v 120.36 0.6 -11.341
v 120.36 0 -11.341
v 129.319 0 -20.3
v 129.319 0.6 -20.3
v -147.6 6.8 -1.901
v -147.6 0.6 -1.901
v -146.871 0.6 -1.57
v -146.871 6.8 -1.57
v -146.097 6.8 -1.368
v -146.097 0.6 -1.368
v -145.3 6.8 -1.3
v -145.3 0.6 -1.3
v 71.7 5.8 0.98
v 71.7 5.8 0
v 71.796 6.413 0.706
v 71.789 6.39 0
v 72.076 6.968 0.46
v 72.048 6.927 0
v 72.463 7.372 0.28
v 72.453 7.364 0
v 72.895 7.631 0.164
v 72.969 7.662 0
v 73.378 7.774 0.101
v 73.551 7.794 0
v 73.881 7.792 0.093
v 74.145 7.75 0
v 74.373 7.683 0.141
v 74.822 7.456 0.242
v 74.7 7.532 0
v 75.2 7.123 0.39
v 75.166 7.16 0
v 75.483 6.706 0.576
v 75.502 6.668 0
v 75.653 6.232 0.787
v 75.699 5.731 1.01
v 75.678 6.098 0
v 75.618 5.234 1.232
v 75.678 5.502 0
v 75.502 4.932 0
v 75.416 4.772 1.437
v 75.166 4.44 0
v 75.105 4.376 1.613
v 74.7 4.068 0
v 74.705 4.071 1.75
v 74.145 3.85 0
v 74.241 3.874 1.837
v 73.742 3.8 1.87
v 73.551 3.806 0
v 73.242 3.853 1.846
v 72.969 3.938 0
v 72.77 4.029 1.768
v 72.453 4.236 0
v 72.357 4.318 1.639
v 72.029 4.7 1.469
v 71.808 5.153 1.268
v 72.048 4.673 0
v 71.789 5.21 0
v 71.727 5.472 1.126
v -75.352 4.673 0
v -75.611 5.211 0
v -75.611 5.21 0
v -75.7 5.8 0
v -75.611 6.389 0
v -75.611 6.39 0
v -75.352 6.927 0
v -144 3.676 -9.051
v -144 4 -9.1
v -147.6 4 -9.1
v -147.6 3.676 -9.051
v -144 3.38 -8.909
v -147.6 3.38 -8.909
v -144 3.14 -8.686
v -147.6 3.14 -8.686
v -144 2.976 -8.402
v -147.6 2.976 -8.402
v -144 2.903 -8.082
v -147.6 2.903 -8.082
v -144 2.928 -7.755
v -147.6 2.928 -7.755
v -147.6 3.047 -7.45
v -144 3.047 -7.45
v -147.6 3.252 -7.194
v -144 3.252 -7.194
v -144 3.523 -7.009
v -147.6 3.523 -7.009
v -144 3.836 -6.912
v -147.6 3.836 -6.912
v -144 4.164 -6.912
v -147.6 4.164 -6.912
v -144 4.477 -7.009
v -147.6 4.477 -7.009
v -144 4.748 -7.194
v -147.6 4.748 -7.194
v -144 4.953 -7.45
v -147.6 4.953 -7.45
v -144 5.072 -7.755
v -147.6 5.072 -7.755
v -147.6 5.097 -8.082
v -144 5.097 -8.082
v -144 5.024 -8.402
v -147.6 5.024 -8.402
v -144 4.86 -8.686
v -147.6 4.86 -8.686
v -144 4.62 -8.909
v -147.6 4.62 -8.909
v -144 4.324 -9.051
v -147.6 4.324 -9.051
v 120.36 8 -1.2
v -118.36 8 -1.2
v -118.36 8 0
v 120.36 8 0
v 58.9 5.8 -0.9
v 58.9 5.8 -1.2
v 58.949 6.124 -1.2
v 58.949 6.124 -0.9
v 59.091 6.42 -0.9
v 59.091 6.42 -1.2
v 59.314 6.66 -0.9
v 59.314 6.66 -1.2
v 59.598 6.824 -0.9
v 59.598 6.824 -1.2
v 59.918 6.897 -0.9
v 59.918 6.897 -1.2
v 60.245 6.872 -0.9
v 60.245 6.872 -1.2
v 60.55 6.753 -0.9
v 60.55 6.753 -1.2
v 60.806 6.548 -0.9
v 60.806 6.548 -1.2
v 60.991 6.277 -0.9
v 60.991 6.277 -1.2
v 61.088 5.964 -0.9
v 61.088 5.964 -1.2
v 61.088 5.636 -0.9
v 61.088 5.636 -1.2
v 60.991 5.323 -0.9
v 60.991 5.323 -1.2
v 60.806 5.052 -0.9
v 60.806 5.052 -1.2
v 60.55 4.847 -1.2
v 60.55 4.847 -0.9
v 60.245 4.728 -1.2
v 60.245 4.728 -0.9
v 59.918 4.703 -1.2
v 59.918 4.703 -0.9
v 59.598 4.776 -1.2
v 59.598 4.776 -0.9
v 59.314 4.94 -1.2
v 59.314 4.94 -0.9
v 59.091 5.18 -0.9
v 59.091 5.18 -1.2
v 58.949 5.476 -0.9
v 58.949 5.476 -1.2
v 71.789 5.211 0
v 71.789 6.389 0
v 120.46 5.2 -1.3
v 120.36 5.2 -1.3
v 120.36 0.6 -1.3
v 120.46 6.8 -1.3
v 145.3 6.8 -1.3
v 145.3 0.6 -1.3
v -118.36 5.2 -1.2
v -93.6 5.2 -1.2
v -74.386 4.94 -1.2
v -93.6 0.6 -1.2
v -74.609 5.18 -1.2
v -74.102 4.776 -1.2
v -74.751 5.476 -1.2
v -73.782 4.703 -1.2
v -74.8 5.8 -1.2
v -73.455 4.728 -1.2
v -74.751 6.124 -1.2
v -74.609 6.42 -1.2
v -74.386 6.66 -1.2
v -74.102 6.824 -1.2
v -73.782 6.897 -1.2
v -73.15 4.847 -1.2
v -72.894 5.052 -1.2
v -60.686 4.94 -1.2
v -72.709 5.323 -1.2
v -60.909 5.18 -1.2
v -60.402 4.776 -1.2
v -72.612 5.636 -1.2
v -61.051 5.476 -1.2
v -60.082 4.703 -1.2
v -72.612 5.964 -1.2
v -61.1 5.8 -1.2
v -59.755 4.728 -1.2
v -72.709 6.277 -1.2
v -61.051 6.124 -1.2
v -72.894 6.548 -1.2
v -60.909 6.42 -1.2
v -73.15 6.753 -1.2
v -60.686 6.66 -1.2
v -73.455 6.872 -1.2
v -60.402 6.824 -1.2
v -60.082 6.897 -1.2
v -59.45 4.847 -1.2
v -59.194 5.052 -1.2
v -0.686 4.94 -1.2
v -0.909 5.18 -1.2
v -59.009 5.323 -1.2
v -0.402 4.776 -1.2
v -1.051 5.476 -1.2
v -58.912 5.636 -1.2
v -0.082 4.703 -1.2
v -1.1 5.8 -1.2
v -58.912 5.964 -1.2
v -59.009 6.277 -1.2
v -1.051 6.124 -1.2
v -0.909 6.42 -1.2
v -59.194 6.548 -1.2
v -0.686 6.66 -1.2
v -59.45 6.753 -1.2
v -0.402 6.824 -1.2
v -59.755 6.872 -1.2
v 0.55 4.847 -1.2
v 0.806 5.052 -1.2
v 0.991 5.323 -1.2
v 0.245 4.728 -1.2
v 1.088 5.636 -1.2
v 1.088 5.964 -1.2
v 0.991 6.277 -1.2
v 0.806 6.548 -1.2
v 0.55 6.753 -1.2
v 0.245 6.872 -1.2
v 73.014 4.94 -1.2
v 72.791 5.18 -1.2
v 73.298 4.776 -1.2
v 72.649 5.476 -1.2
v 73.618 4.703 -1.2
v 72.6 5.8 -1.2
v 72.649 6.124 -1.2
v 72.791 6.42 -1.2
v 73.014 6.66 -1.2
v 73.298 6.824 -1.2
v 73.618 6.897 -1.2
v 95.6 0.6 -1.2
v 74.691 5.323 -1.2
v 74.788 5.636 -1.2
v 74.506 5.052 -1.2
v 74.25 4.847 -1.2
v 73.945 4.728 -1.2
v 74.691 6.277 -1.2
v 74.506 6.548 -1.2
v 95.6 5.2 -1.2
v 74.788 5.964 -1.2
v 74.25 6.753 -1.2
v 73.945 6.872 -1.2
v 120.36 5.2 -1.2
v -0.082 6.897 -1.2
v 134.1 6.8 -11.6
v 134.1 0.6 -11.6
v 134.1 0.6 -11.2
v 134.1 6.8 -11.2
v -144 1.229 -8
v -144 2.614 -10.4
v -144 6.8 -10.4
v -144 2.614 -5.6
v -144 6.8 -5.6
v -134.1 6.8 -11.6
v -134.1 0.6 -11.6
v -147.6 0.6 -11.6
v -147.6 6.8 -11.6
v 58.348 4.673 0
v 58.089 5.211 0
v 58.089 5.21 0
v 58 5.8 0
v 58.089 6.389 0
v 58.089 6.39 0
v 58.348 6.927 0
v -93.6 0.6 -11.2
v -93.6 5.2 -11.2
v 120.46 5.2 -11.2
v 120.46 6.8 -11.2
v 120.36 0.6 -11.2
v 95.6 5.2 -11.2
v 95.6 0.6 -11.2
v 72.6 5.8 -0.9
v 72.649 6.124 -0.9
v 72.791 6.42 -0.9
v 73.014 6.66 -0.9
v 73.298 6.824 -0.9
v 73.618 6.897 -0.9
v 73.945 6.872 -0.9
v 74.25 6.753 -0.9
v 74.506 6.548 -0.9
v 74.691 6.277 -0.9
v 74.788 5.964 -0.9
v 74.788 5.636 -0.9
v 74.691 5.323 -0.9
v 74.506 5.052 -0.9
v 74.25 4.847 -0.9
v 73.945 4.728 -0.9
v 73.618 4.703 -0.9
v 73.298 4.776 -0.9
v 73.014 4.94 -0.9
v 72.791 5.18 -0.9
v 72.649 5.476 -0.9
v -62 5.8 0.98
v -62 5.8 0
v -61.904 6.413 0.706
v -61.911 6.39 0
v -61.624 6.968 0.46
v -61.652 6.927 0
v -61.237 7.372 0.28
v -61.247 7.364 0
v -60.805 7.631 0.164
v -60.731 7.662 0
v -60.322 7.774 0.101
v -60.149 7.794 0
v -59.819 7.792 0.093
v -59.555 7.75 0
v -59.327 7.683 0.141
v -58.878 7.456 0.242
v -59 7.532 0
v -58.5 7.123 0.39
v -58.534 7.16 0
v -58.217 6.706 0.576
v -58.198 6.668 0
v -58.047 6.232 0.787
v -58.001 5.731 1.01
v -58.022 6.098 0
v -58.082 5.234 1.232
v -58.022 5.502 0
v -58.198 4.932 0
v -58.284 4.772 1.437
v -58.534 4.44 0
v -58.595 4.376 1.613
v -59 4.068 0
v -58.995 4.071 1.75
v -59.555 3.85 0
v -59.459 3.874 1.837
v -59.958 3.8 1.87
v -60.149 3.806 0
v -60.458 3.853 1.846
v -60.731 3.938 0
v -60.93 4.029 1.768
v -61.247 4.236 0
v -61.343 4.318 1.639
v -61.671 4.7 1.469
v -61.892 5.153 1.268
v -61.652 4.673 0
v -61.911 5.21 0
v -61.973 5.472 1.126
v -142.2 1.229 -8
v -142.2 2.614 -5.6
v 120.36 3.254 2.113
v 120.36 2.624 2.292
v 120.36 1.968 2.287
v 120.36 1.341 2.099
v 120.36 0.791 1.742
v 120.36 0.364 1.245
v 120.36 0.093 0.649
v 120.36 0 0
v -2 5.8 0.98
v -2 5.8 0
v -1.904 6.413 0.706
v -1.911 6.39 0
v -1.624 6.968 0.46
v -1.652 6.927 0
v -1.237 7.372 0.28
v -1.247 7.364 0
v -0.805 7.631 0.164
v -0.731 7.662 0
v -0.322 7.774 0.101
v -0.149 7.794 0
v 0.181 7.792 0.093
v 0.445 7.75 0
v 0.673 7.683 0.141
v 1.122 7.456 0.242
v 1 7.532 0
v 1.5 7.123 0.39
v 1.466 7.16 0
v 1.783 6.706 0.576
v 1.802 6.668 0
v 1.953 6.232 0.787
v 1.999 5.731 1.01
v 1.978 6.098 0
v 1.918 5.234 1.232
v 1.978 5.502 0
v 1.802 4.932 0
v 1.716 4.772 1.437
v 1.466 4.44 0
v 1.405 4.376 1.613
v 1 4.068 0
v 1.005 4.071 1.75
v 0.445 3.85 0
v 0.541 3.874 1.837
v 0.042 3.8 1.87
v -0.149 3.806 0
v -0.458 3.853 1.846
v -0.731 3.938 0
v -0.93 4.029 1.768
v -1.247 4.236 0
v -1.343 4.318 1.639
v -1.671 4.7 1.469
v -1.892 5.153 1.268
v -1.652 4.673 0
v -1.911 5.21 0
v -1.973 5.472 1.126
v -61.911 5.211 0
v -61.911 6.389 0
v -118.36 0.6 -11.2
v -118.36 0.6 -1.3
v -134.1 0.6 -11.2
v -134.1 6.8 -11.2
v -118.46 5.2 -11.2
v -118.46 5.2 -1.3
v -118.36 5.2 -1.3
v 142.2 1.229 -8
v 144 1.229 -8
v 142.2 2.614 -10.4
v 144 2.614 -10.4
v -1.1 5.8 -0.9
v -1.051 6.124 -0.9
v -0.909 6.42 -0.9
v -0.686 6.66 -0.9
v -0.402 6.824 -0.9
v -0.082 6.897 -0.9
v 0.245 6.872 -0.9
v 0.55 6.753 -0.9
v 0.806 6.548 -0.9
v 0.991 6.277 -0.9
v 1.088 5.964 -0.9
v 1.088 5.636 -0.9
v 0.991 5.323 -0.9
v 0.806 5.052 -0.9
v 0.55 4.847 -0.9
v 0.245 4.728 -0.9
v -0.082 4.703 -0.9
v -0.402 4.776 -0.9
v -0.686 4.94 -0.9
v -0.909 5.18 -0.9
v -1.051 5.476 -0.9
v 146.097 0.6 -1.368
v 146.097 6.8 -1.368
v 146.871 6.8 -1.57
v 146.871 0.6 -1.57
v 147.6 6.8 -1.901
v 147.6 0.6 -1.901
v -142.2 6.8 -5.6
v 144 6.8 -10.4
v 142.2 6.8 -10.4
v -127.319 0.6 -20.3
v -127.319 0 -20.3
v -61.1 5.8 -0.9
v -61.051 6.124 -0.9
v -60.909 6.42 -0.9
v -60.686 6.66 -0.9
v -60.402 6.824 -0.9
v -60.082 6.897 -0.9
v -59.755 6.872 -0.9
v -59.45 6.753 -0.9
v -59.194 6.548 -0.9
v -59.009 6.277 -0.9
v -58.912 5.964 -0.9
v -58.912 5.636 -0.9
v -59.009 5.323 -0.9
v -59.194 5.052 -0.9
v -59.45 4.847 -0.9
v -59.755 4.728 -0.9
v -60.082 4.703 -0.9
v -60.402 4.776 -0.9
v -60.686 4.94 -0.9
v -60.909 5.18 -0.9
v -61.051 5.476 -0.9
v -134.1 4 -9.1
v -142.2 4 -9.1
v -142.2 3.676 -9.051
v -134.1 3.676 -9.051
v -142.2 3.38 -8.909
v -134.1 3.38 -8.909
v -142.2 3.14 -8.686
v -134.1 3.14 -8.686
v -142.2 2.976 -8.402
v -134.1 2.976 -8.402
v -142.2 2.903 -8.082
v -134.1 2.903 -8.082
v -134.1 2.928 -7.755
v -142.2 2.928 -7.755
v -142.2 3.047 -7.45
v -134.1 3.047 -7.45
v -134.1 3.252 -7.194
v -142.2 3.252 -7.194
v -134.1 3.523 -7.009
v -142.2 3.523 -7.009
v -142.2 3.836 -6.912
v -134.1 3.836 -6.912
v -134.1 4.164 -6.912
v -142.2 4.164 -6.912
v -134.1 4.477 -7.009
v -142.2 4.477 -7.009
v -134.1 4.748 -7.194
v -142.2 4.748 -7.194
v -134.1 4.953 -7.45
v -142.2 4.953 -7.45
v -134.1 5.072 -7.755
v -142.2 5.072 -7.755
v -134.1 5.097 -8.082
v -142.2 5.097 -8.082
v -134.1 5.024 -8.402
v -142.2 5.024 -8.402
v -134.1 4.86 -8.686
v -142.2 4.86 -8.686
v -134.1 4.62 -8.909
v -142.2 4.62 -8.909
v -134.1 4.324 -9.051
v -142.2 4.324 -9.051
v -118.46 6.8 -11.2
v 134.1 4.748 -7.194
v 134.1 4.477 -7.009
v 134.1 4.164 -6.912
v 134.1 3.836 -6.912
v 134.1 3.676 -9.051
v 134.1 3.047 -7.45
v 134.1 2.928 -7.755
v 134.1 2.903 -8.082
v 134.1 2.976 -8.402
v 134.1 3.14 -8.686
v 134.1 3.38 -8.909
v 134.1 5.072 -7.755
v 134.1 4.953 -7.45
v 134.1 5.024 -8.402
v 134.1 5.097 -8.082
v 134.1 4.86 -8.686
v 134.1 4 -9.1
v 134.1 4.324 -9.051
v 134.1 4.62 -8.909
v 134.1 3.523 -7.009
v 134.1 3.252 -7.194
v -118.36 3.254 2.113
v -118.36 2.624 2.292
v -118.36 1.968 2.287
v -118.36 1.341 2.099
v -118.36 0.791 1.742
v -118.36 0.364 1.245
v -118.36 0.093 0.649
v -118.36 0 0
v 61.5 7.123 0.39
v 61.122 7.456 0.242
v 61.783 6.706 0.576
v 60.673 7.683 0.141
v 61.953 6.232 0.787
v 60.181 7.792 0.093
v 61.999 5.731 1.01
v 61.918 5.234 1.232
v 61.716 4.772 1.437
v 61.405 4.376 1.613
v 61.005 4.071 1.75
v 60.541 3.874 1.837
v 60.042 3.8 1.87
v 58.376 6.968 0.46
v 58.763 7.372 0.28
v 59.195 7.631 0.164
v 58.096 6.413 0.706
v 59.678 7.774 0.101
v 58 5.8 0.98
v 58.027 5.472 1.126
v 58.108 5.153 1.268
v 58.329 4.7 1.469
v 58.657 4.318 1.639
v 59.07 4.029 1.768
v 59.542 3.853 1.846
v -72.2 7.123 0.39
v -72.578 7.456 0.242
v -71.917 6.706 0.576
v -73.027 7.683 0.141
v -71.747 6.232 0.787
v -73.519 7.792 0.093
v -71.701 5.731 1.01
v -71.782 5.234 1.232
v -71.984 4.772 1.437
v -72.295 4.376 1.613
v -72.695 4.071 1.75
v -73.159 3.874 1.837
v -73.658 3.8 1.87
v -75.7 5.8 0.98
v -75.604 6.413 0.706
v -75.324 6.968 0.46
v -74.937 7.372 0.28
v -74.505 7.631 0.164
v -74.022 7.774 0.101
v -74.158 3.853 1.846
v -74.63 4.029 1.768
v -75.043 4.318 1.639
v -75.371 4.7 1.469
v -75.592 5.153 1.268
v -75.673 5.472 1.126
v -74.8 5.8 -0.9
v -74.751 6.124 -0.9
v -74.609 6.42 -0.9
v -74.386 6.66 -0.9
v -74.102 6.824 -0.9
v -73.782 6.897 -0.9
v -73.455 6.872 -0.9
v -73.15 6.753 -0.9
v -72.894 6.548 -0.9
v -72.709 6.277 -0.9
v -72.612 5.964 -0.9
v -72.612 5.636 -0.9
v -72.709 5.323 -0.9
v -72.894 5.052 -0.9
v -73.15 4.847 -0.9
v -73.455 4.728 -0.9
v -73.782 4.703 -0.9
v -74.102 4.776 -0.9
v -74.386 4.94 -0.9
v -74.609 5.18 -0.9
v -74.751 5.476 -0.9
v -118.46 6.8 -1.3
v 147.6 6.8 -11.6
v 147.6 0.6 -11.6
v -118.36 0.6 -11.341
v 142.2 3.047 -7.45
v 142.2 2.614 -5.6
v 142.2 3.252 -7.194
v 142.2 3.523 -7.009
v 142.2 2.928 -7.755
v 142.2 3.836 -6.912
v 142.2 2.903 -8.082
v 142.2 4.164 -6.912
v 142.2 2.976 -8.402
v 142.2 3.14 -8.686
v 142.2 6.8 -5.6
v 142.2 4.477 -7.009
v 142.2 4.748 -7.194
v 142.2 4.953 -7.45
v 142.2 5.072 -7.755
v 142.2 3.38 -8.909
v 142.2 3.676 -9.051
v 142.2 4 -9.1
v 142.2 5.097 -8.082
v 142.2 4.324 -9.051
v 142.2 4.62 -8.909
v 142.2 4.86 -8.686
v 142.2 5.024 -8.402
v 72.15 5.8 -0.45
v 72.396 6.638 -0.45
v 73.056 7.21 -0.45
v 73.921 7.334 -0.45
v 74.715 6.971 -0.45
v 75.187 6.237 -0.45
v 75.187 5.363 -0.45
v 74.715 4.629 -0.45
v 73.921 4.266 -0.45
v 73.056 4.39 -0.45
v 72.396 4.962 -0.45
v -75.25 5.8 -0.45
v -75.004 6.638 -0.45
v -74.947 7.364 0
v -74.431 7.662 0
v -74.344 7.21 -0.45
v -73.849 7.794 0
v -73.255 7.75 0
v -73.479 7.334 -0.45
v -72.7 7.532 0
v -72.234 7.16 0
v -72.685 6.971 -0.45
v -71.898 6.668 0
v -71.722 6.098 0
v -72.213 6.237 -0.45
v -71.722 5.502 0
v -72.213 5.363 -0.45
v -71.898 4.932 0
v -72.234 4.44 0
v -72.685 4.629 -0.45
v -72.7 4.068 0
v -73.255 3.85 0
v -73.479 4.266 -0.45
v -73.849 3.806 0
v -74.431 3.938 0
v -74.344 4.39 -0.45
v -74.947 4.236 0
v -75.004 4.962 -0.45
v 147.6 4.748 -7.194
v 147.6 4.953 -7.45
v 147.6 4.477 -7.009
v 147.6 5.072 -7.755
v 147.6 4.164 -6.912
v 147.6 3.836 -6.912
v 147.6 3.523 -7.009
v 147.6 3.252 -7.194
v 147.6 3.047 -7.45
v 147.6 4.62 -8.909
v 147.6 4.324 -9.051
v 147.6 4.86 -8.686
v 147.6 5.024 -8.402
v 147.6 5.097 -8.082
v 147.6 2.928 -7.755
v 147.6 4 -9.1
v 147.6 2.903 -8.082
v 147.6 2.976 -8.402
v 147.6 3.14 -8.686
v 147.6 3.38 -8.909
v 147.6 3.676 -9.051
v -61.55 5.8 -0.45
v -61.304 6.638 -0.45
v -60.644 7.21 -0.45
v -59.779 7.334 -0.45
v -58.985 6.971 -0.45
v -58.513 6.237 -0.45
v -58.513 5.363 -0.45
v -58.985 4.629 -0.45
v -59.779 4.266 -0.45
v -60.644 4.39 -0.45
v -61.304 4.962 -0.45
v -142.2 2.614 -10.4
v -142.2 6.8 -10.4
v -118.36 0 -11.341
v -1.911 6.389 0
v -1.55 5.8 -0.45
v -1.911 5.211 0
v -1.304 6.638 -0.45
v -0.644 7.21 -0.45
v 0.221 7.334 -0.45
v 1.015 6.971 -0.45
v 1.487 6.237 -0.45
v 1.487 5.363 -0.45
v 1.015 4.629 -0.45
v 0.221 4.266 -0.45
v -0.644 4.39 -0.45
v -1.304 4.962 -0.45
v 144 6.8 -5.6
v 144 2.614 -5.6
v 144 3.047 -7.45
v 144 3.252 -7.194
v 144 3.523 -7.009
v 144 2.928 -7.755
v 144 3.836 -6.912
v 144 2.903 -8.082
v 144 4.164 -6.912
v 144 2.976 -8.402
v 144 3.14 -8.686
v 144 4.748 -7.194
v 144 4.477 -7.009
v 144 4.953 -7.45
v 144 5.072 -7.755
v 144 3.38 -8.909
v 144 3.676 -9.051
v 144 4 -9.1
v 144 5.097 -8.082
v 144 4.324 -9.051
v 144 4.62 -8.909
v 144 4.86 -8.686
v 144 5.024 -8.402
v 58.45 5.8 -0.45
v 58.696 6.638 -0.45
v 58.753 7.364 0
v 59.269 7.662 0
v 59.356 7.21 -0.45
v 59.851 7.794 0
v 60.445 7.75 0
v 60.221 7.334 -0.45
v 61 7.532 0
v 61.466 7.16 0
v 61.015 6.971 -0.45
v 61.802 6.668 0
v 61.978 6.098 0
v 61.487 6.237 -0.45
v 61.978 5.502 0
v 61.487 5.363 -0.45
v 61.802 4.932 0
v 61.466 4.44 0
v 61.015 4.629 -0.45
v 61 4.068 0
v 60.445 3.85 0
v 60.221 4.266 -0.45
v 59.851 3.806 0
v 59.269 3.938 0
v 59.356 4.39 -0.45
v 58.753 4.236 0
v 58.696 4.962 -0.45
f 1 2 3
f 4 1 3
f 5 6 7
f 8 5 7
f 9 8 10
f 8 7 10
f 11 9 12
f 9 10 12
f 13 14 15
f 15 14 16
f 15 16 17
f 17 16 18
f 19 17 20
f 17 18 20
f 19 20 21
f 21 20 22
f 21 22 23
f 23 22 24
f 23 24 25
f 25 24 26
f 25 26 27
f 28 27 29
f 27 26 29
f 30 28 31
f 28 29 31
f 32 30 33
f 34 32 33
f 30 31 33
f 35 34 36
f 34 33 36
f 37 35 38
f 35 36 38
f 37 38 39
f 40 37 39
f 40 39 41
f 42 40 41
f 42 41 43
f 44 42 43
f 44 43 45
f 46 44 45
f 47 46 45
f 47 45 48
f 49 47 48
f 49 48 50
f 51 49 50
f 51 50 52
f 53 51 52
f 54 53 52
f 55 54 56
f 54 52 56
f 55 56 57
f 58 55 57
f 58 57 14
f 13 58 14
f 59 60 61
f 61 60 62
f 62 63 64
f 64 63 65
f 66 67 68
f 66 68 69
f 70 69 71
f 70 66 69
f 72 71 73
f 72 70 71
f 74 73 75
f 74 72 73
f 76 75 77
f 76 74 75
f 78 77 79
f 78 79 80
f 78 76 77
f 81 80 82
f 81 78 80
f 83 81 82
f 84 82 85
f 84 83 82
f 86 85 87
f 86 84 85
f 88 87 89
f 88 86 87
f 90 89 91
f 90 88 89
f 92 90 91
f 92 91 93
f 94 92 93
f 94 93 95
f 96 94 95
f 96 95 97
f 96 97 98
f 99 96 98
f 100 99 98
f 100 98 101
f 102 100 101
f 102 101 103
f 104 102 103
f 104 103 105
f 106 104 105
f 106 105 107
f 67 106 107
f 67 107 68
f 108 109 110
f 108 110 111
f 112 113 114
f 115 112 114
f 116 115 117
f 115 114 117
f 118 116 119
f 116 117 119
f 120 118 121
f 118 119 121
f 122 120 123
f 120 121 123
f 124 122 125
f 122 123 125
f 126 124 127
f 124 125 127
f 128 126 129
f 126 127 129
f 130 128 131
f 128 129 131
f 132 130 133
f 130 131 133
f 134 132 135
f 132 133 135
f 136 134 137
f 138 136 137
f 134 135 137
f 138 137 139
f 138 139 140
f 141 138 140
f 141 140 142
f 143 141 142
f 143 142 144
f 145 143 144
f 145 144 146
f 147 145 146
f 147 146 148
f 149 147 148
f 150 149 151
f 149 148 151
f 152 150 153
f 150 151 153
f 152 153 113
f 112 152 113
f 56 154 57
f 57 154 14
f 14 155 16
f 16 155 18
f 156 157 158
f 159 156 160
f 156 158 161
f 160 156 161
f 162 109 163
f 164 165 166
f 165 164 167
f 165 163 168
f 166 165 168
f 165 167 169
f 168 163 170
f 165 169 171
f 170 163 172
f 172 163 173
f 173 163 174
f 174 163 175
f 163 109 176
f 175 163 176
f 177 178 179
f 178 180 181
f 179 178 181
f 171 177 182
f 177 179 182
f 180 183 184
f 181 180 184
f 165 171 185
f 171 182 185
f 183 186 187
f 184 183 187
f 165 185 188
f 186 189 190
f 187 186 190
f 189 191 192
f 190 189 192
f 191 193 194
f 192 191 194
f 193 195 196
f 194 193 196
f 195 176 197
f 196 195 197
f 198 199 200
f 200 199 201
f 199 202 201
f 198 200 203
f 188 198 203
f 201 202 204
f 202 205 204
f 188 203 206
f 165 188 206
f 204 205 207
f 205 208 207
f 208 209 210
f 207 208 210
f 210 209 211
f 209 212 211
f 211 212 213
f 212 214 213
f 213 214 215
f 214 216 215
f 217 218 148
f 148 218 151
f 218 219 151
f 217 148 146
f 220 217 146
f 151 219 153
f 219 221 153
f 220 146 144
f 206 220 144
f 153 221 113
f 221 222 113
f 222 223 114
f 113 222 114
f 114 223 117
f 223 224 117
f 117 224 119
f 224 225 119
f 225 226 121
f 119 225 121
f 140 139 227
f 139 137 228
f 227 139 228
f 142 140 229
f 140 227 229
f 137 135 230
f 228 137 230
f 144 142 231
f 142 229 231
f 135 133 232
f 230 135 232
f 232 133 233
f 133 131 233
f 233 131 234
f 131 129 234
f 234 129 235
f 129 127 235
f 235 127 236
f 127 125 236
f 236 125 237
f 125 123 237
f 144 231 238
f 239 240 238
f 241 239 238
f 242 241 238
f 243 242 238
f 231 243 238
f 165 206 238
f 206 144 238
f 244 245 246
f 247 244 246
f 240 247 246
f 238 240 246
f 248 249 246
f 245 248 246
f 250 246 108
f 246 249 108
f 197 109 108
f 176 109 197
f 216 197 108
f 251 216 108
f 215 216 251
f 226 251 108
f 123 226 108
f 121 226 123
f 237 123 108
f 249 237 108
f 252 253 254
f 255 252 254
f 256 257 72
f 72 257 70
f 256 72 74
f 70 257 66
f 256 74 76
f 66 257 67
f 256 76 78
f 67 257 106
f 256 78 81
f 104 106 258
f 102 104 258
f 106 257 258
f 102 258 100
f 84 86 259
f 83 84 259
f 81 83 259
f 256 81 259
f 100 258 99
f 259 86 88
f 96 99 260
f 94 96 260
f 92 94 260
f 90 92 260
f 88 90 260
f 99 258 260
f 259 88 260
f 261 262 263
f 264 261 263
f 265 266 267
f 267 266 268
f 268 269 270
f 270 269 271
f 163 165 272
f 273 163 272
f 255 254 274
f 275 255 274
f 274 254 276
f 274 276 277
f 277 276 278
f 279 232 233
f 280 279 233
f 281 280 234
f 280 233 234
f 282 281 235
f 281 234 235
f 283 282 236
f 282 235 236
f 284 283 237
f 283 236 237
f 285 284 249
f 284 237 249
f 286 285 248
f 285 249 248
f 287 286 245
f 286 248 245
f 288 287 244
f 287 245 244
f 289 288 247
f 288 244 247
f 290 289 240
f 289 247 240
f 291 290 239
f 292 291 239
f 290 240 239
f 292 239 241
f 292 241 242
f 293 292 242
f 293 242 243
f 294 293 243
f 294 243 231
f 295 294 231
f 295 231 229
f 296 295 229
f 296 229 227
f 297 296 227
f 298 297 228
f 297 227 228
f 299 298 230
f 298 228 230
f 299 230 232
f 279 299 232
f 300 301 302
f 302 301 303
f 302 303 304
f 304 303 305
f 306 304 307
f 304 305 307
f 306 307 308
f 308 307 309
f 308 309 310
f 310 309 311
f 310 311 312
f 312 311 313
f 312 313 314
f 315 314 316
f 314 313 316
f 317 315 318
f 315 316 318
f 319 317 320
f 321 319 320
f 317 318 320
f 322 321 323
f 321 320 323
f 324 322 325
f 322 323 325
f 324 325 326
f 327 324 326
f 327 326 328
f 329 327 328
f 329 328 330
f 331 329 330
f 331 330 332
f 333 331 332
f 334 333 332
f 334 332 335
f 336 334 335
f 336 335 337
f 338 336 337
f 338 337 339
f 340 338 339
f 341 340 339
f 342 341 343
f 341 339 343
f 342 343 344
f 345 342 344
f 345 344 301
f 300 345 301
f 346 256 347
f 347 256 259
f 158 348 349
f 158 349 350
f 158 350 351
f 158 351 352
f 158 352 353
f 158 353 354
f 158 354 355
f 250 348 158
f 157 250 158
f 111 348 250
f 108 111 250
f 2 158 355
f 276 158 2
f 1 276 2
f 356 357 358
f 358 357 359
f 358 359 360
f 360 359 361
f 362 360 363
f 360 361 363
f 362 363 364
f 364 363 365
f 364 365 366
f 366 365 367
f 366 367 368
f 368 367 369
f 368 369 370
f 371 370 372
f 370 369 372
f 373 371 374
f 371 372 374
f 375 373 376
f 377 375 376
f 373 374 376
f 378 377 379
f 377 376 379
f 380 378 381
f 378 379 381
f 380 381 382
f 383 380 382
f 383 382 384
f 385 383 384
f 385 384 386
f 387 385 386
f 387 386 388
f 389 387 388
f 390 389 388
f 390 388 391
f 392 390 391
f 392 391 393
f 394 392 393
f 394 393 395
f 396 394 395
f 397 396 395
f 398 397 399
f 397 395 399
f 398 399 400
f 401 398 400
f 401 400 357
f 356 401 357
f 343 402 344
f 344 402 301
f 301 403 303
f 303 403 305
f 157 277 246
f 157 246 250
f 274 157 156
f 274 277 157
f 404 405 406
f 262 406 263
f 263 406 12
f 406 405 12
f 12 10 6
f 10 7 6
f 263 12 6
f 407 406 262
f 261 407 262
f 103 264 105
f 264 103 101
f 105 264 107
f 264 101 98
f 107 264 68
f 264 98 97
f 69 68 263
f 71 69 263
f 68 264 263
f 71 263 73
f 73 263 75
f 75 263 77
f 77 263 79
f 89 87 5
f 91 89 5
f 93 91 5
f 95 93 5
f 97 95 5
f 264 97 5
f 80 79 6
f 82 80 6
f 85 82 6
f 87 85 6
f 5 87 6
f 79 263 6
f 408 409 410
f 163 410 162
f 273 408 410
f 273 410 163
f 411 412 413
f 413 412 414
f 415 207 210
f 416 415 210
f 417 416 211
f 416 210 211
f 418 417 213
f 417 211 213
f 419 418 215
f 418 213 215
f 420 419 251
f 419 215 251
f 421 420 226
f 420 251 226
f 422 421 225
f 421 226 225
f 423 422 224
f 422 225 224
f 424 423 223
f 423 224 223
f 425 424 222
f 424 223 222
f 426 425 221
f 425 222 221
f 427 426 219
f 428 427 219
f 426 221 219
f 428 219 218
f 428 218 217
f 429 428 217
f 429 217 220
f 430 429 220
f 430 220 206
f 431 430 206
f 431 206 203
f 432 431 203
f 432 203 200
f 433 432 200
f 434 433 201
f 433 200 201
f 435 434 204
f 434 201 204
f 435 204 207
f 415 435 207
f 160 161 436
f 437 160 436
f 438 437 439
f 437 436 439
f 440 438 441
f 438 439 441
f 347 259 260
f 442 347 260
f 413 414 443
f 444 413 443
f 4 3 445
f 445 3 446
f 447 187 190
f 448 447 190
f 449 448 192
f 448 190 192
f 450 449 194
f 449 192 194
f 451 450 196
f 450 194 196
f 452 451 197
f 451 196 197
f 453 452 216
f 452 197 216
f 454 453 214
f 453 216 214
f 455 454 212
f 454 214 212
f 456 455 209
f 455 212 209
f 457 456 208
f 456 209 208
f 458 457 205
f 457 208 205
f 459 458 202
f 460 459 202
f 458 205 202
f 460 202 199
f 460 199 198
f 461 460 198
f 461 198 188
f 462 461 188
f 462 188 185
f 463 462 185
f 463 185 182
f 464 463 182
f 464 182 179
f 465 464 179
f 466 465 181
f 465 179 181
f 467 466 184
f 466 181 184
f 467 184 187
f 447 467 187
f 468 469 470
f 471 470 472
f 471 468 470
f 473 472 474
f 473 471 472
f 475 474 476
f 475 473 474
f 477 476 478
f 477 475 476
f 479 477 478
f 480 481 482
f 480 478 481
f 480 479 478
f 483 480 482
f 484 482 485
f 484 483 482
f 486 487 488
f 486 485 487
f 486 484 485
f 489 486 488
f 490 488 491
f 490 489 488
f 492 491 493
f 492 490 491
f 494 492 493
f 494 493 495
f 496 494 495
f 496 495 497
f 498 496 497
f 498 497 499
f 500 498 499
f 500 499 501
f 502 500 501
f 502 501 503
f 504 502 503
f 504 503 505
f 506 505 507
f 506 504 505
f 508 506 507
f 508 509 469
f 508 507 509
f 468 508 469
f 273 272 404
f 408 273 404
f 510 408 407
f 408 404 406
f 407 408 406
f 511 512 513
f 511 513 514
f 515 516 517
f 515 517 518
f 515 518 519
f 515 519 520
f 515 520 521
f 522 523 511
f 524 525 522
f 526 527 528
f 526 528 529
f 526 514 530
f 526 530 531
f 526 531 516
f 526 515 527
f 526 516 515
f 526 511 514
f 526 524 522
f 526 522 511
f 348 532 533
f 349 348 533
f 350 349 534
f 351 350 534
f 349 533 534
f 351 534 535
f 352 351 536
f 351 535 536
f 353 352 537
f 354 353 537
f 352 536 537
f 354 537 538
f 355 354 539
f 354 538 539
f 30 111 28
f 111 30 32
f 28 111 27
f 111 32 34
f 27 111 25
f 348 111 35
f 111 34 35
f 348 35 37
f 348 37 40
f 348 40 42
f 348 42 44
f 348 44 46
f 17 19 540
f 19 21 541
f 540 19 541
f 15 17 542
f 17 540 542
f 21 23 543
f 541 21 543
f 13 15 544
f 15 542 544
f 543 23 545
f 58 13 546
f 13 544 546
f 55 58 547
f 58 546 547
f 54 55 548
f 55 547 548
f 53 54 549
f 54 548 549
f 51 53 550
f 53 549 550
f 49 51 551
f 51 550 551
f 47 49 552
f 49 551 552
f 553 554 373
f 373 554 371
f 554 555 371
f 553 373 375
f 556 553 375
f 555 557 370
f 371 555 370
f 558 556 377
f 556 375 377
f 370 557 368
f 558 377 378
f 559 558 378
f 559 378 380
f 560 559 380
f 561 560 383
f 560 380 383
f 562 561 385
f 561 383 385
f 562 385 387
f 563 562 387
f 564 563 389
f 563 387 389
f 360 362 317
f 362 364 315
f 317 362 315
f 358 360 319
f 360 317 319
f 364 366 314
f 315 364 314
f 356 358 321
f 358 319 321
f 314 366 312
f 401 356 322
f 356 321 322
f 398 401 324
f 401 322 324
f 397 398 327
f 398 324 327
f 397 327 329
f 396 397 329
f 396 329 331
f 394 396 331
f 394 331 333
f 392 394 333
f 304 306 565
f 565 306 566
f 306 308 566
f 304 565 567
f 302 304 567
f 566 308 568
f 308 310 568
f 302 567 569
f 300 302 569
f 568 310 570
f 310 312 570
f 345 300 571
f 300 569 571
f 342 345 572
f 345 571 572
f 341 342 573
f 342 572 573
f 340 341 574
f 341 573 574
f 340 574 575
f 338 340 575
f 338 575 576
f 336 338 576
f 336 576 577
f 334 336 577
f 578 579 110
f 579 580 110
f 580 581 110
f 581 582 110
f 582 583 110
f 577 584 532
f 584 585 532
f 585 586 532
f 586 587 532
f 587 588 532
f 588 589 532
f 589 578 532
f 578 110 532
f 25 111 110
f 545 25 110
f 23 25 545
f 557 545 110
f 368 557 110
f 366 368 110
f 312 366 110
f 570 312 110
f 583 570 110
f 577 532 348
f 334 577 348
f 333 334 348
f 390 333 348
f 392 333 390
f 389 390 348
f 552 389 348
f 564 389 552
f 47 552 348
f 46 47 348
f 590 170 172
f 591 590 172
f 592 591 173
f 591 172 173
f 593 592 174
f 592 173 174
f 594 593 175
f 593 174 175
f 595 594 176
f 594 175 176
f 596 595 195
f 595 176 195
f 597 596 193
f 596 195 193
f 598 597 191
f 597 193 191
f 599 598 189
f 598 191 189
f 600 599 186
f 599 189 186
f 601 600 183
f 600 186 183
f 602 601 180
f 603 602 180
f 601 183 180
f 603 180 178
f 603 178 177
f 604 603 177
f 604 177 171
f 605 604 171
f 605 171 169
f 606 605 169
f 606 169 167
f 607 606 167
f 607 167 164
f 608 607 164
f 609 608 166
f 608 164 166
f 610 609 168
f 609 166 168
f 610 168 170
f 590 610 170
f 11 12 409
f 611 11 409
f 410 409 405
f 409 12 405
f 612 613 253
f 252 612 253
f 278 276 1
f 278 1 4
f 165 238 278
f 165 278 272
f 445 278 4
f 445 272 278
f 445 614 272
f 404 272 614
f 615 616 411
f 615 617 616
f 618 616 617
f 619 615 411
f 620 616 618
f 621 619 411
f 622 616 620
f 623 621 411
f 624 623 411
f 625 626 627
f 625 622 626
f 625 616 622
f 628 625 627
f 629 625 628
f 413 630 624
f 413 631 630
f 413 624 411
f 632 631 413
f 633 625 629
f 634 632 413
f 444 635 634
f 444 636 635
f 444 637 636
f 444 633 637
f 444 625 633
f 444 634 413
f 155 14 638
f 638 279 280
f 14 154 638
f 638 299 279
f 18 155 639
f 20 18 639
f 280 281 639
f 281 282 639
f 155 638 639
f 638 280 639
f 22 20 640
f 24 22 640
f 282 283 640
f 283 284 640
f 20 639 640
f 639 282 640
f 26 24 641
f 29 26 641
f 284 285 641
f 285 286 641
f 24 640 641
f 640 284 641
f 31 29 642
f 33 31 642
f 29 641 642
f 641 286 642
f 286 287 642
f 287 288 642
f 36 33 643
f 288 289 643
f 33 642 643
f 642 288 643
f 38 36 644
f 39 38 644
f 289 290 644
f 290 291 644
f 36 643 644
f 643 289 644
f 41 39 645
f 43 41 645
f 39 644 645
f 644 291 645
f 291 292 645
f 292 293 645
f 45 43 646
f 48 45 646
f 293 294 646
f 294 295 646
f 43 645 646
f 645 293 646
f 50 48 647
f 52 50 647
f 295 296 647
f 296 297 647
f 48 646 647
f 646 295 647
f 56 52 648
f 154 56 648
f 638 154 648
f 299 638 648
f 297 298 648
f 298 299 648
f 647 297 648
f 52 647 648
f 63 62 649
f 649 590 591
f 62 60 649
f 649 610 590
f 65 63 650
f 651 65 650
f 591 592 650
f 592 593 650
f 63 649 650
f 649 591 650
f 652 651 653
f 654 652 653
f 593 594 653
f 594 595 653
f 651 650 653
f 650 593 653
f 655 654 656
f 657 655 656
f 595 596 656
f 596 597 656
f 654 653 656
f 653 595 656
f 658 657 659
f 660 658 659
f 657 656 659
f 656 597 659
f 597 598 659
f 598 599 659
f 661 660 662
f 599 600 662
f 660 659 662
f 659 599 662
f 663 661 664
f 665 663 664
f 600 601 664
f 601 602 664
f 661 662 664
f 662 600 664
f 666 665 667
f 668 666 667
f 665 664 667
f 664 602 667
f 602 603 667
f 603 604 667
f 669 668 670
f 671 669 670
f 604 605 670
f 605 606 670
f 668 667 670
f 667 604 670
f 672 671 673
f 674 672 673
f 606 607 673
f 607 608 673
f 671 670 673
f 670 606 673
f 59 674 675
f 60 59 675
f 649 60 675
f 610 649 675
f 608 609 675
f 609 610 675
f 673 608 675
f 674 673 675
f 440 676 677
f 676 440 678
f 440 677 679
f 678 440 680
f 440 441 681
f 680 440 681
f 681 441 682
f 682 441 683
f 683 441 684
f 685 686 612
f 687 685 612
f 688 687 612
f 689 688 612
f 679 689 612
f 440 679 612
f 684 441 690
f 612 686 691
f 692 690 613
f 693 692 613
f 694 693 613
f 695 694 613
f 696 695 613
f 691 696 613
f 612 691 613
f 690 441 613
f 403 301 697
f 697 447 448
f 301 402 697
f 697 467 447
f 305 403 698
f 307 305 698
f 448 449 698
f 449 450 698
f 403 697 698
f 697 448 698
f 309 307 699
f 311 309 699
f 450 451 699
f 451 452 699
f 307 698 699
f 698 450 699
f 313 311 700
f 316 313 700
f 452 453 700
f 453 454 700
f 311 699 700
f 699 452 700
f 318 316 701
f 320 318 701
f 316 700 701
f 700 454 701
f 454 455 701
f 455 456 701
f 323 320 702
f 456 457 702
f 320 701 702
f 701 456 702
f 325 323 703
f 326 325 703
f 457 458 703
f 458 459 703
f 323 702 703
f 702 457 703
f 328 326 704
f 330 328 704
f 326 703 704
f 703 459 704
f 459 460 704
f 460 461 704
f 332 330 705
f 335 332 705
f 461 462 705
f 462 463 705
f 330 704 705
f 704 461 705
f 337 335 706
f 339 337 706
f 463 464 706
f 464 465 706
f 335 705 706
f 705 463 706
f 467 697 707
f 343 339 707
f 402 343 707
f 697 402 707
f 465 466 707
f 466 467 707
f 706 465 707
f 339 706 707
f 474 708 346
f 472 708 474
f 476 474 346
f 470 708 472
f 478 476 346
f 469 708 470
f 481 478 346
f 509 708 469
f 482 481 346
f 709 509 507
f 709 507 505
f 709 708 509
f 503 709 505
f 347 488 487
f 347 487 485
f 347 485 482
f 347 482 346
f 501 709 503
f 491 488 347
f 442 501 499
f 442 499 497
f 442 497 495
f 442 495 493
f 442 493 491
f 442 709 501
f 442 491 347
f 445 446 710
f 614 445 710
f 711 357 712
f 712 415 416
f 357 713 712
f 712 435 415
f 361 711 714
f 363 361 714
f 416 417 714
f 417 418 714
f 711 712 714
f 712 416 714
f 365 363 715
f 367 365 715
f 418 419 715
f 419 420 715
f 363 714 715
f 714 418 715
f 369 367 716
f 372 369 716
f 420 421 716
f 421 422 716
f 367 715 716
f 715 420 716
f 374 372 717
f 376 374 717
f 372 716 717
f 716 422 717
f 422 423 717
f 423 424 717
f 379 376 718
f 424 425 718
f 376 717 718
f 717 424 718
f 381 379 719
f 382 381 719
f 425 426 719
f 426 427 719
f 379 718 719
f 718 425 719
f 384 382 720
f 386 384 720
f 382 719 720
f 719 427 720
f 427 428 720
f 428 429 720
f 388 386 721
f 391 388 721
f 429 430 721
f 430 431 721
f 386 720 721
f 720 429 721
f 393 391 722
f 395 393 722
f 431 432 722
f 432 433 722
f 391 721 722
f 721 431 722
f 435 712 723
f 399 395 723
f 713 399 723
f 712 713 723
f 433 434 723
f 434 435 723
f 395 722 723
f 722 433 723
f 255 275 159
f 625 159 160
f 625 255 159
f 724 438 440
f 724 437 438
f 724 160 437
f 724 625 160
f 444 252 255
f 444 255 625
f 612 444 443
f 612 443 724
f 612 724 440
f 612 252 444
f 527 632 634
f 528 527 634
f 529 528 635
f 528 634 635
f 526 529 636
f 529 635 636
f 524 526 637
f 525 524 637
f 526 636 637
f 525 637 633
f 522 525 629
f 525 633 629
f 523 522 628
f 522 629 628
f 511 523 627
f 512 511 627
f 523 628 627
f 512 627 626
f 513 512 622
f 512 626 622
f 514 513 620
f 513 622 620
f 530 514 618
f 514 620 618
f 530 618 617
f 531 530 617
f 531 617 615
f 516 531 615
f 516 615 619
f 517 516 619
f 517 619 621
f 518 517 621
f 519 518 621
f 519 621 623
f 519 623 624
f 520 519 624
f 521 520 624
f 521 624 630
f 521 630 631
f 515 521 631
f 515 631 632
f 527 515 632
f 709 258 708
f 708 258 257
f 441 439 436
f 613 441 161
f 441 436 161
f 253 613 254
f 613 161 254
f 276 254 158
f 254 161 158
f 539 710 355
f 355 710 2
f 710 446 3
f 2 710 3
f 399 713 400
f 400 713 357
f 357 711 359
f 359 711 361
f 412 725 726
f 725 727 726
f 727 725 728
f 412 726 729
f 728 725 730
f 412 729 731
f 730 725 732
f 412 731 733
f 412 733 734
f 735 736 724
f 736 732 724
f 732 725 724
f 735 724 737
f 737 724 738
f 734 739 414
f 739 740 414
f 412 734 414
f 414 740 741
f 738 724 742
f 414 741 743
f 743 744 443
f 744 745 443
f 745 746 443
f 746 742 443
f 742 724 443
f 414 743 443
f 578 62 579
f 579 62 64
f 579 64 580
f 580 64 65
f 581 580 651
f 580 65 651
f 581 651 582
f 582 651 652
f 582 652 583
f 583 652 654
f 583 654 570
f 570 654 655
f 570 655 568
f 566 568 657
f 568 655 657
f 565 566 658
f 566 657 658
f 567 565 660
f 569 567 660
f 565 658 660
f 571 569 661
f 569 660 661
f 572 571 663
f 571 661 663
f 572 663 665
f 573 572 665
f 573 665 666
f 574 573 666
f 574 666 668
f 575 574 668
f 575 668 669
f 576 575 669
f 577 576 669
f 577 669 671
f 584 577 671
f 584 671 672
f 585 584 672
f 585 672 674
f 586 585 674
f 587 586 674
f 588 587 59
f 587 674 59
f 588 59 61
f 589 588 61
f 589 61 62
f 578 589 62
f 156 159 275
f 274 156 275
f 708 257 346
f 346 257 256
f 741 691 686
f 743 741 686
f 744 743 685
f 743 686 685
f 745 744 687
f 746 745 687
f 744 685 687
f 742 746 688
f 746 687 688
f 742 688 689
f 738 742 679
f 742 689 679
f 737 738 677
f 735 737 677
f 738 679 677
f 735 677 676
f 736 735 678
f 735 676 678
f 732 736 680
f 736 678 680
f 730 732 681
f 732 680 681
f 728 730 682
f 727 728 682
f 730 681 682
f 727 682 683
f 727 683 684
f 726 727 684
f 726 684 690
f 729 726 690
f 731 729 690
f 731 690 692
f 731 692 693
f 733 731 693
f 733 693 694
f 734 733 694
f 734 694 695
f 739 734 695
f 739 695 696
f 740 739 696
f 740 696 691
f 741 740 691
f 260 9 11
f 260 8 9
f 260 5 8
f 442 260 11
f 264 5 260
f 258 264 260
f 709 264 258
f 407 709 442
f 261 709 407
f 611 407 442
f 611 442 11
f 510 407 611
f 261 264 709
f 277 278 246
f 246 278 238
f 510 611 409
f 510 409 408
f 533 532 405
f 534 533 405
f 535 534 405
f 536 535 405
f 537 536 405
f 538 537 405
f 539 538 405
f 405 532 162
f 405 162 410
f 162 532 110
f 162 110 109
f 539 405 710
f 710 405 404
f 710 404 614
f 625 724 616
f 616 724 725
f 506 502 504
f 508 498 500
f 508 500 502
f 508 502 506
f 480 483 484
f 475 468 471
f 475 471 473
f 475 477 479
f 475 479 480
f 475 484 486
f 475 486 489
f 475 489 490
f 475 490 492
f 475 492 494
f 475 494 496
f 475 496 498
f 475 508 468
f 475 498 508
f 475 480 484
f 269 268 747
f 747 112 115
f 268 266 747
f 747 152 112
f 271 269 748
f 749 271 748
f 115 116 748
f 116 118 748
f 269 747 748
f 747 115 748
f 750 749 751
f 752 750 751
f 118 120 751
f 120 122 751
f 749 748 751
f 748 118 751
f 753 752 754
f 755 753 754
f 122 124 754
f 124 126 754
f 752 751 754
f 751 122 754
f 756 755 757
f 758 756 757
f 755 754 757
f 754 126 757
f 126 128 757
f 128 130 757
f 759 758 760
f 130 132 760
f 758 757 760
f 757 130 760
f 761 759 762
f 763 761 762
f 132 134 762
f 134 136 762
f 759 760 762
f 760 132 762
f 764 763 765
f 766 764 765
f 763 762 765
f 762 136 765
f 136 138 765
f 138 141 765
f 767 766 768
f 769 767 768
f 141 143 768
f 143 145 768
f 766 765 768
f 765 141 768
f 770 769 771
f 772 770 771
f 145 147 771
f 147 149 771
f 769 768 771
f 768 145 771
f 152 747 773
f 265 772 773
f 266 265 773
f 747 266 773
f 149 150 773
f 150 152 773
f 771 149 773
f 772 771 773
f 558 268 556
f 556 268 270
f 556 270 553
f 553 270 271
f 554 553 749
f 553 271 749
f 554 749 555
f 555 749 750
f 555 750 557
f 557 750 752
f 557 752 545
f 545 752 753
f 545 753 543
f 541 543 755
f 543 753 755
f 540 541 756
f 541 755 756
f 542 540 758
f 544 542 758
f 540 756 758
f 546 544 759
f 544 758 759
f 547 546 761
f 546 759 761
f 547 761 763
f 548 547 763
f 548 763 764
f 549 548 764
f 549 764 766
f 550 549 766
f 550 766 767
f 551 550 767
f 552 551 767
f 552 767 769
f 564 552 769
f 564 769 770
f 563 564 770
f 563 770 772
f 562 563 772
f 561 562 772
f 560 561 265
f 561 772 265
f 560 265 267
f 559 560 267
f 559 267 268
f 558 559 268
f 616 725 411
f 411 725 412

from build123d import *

# Parameters (mm, degrees)
BOSS_EXTRUDE1_DEPTH = 8
BOSS_EXTRUDE2_DEPTH = 0.6
CUT_EXTRUDE1_DEPTH  = 0.6
SKETCH4_R           = 1.1
CUT_EXTRUDE2_DEPTH  = 13.5
CUT_EXTRUDE3_START  = -13.5
SKETCH5_R           = 1.1
CUT_EXTRUDE3_DEPTH  = 13.5
CUT_EXTRUDE6_START  = -3.6
CUT_EXTRUDE6_DEPTH  = 1.8
CUT_EXTRUDE7_START  = -3.6
CUT_EXTRUDE7_DEPTH  = 1.8
SKETCH8_W           = 295.2
SKETCH8_H           = 19.1
CUT_EXTRUDE8_DEPTH  = 1.2
SKETCH9_W           = 24.86
SKETCH9_H           = 10
CUT_EXTRUDE9_DEPTH  = 1.6
BOSS_EXTRUDE3_DEPTH = 238.72
SKETCH11_R          = 1.1
CUT_EXTRUDE10_DEPTH = 1.2
CUT_EXTRUDE11_REACH = 151.204
SKETCH12_R          = 2
CHAMFER1_SIZE       = 0.9


with BuildPart() as part:
    # Sketch1 → Boss-Extrude1 (new body)
    with BuildSketch(Plane(origin=(0, 0, 0), x_dir=(1, 0, 0), z_dir=(0, 1, 0))):
        with BuildLine():
            Line((-118.36, 0), (120.36, 0))
            Line((120.36, 0), (120.36, 1.3))
            Line((120.36, 1.3), (145.3, 1.3))
            ThreePointArc((145.3, 1.3), (146.488640518, 1.452788358), (147.6, 1.901219694))
            Line((147.6, 1.901219694), (147.6, 11.6))
            Line((147.6, 11.6), (134.1, 11.6))
            Line((134.1, 11.6), (134.1, 11.2))
            Line((134.1, 11.2), (95.6, 11.2))
            Line((95.6, 11.2), (95.6, 1.2))
            Line((95.6, 1.2), (-93.6, 1.2))
            Line((-93.6, 1.2), (-93.6, 11.2))
            Line((-93.6, 11.2), (-134.1, 11.2))
            Line((-134.1, 11.2), (-134.1, 11.6))
            Line((-134.1, 11.6), (-147.6, 11.6))
            Line((-147.6, 11.6), (-147.6, 1.901219694))
            ThreePointArc((-147.6, 1.901219694), (-146.488640518, 1.452788358), (-145.3, 1.3))
            Line((-145.3, 1.3), (-118.36, 1.3))
            Line((-118.36, 1.3), (-118.36, 0))
        make_face()
    extrude(amount=BOSS_EXTRUDE1_DEPTH)

    # Sketch2 → Boss-Extrude2 (add)
    with BuildSketch(Plane.XZ):
        Polygon((120.36, -1.2), (120.36, -11.341421356), (129.318578644, -20.3), (-127.318578644, -20.3), (-118.36, -11.341421356), (-118.36, -1.2), align=None)
    extrude(amount=-BOSS_EXTRUDE2_DEPTH)

    # Sketch3 → Cut-Extrude1 (cut)
    with BuildSketch(Plane.XZ):
        Polygon((-118.36, -11.2), (-134.1, -11.2), (-134.1, -11.6), (-147.6, -11.6), (-147.6, -1.3), (-118.36, -1.3), align=None)
        Polygon((120.36, -1.3), (147.6, -1.3), (147.6, -11.6), (134.1, -11.6), (134.1, -11.2), (120.36, -11.2), align=None)
    extrude(amount=-CUT_EXTRUDE1_DEPTH, mode=Mode.SUBTRACT)

    # Sketch4 → Cut-Extrude2 (cut)
    with BuildSketch(Plane(origin=(147.6, 0, 0), x_dir=(0, 0, -1), z_dir=(1, 0, 0))):
        with Locations((8, 4)):
            Circle(SKETCH4_R)
    extrude(amount=-CUT_EXTRUDE2_DEPTH, mode=Mode.SUBTRACT)

    # Sketch5 → Cut-Extrude3 (cut)
    with BuildSketch(Plane.ZY.offset(147.6).offset(CUT_EXTRUDE3_START)):
        with Locations(Location((-8, 4, 0), (0, 0, 180))):
            Circle(SKETCH5_R)
    extrude(amount=CUT_EXTRUDE3_DEPTH, mode=Mode.SUBTRACT)

    # Sketch6 → Cut-Extrude6 (cut)
    with BuildSketch(Plane(origin=(147.6, 0, 0), x_dir=(0, 0, -1), z_dir=(1, 0, 0)).offset(CUT_EXTRUDE6_START)):
        Polygon((5.6, 5.385640646), (5.6, 2.614359354), (8, 1.228718708), (10.4, 2.614359354), (10.4, 5.385640646), (10.4, 8), (5.6, 8), align=None)
    extrude(amount=-CUT_EXTRUDE6_DEPTH, mode=Mode.SUBTRACT)

    # Sketch7 → Cut-Extrude7 (cut)
    with BuildSketch(Plane.ZY.offset(147.6).offset(CUT_EXTRUDE7_START)):
        Polygon((-10.4, 8), (-10.4, 2.614359354), (-8, 1.228718708), (-5.6, 2.614359354), (-5.6, 8), align=None)
    extrude(amount=-CUT_EXTRUDE7_DEPTH, mode=Mode.SUBTRACT)

    # Sketch8 → Cut-Extrude8 (cut)
    with BuildSketch(Plane(origin=(0, 8, 0), x_dir=(1, 0, 0), z_dir=(0, 1, 0))):
        with Locations((0, 10.75)):
            Rectangle(SKETCH8_W, SKETCH8_H)
    extrude(amount=-CUT_EXTRUDE8_DEPTH, mode=Mode.SUBTRACT)

    # Sketch9 → Cut-Extrude9 (cut)
    with BuildSketch(Plane(origin=(0, 6.8, 0), x_dir=(1, 0, 0), z_dir=(0, 1, 0))):
        with Locations((108.03, 6.2)):
            Rectangle(SKETCH9_W, SKETCH9_H)
        with Locations((-106.03, 6.2)):
            Rectangle(SKETCH9_W, SKETCH9_H)
    extrude(amount=-CUT_EXTRUDE9_DEPTH, mode=Mode.SUBTRACT)

    # Sketch10 → Boss-Extrude3 (add)
    with BuildSketch(Plane.ZY.offset(118.36)):
        with BuildLine():
            Line((0, 8), (2.113102916, 3.253893145))
            ThreePointArc((2.113102916, 3.253893145), (1.939911372, 1.053285936), (0, 0))
            Line((0, 0), (0, 8))
        make_face()
    extrude(amount=-BOSS_EXTRUDE3_DEPTH)

    # Sketch11 → Cut-Extrude10 (cut)
    with BuildSketch(Plane(origin=(0, 0, -1.2), x_dir=(-1, 0, 0), z_dir=(0, 0, -1))):
        with Locations((73.7, 5.8)):
            Circle(SKETCH11_R)
        with Locations((-73.7, 5.8)):
            Circle(SKETCH11_R)
        with Locations((60, 5.8)):
            Circle(SKETCH11_R)
        with Locations((0, 5.8)):
            Circle(SKETCH11_R)
        with Locations((-60, 5.8)):
            Circle(SKETCH11_R)
    extrude(amount=-CUT_EXTRUDE10_DEPTH, mode=Mode.SUBTRACT)

    # Sketch12 → Cut-Extrude11 (cut, up to next)
    with BuildSketch(Plane(origin=(0, 0, 0), x_dir=(-1, 0, 0), z_dir=(0, 0, -1)), mode=Mode.PRIVATE) as cut_extrude11_sk1:
        with Locations((-73.7, 5.8)):
            Circle(SKETCH12_R)
    cut_extrude11_tool1 = extrude(cut_extrude11_sk1.sketch, amount=-CUT_EXTRUDE11_REACH, mode=Mode.PRIVATE) & part.part
    # Sketch12 → Cut-Extrude11 (cut, up to next)
    with BuildSketch(Plane(origin=(0, 0, 0), x_dir=(-1, 0, 0), z_dir=(0, 0, -1)), mode=Mode.PRIVATE) as cut_extrude11_sk2:
        with Locations((73.7, 5.8)):
            Circle(SKETCH12_R)
    cut_extrude11_tool2 = extrude(cut_extrude11_sk2.sketch, amount=-CUT_EXTRUDE11_REACH, mode=Mode.PRIVATE) & part.part
    # Sketch12 → Cut-Extrude11 (cut, up to next)
    with BuildSketch(Plane(origin=(0, 0, 0), x_dir=(-1, 0, 0), z_dir=(0, 0, -1)), mode=Mode.PRIVATE) as cut_extrude11_sk3:
        with Locations((-60, 5.8)):
            Circle(SKETCH12_R)
    cut_extrude11_tool3 = extrude(cut_extrude11_sk3.sketch, amount=-CUT_EXTRUDE11_REACH, mode=Mode.PRIVATE) & part.part
    # Sketch12 → Cut-Extrude11 (cut, up to next)
    with BuildSketch(Plane(origin=(0, 0, 0), x_dir=(-1, 0, 0), z_dir=(0, 0, -1)), mode=Mode.PRIVATE) as cut_extrude11_sk4:
        with Locations((0, 5.8)):
            Circle(SKETCH12_R)
    cut_extrude11_tool4 = extrude(cut_extrude11_sk4.sketch, amount=-CUT_EXTRUDE11_REACH, mode=Mode.PRIVATE) & part.part
    # Sketch12 → Cut-Extrude11 (cut, up to next)
    with BuildSketch(Plane(origin=(0, 0, 0), x_dir=(-1, 0, 0), z_dir=(0, 0, -1)), mode=Mode.PRIVATE) as cut_extrude11_sk5:
        with Locations((60, 5.8)):
            Circle(SKETCH12_R)
    cut_extrude11_tool5 = extrude(cut_extrude11_sk5.sketch, amount=-CUT_EXTRUDE11_REACH, mode=Mode.PRIVATE) & part.part
    add(cut_extrude11_tool1.solids().sort_by_distance((73.7, 5.8, 0))[0], mode=Mode.SUBTRACT)
    add(cut_extrude11_tool2.solids().sort_by_distance((-73.7, 5.8, 0))[0], mode=Mode.SUBTRACT)
    add(cut_extrude11_tool3.solids().sort_by_distance((60, 5.8, 0))[0], mode=Mode.SUBTRACT)
    add(cut_extrude11_tool4.solids().sort_by_distance((0, 5.8, 0))[0], mode=Mode.SUBTRACT)
    add(cut_extrude11_tool5.solids().sort_by_distance((-60, 5.8, 0))[0], mode=Mode.SUBTRACT)

    # Chamfer1
    chamfer1_edges = [part.edges().sort_by_distance(p)[0] for p in [
        (74.8, 5.8, 0),
        (-58.9, 5.8, 0),
        (1.1, 5.8, 0),
        (61.1, 5.8, 0),
        (-72.6, 5.8, 0),
    ]]
    chamfer(chamfer1_edges, length=CHAMFER1_SIZE - 0.0001)  # a hair under: the kernel refuses the full size


solid = part.part
